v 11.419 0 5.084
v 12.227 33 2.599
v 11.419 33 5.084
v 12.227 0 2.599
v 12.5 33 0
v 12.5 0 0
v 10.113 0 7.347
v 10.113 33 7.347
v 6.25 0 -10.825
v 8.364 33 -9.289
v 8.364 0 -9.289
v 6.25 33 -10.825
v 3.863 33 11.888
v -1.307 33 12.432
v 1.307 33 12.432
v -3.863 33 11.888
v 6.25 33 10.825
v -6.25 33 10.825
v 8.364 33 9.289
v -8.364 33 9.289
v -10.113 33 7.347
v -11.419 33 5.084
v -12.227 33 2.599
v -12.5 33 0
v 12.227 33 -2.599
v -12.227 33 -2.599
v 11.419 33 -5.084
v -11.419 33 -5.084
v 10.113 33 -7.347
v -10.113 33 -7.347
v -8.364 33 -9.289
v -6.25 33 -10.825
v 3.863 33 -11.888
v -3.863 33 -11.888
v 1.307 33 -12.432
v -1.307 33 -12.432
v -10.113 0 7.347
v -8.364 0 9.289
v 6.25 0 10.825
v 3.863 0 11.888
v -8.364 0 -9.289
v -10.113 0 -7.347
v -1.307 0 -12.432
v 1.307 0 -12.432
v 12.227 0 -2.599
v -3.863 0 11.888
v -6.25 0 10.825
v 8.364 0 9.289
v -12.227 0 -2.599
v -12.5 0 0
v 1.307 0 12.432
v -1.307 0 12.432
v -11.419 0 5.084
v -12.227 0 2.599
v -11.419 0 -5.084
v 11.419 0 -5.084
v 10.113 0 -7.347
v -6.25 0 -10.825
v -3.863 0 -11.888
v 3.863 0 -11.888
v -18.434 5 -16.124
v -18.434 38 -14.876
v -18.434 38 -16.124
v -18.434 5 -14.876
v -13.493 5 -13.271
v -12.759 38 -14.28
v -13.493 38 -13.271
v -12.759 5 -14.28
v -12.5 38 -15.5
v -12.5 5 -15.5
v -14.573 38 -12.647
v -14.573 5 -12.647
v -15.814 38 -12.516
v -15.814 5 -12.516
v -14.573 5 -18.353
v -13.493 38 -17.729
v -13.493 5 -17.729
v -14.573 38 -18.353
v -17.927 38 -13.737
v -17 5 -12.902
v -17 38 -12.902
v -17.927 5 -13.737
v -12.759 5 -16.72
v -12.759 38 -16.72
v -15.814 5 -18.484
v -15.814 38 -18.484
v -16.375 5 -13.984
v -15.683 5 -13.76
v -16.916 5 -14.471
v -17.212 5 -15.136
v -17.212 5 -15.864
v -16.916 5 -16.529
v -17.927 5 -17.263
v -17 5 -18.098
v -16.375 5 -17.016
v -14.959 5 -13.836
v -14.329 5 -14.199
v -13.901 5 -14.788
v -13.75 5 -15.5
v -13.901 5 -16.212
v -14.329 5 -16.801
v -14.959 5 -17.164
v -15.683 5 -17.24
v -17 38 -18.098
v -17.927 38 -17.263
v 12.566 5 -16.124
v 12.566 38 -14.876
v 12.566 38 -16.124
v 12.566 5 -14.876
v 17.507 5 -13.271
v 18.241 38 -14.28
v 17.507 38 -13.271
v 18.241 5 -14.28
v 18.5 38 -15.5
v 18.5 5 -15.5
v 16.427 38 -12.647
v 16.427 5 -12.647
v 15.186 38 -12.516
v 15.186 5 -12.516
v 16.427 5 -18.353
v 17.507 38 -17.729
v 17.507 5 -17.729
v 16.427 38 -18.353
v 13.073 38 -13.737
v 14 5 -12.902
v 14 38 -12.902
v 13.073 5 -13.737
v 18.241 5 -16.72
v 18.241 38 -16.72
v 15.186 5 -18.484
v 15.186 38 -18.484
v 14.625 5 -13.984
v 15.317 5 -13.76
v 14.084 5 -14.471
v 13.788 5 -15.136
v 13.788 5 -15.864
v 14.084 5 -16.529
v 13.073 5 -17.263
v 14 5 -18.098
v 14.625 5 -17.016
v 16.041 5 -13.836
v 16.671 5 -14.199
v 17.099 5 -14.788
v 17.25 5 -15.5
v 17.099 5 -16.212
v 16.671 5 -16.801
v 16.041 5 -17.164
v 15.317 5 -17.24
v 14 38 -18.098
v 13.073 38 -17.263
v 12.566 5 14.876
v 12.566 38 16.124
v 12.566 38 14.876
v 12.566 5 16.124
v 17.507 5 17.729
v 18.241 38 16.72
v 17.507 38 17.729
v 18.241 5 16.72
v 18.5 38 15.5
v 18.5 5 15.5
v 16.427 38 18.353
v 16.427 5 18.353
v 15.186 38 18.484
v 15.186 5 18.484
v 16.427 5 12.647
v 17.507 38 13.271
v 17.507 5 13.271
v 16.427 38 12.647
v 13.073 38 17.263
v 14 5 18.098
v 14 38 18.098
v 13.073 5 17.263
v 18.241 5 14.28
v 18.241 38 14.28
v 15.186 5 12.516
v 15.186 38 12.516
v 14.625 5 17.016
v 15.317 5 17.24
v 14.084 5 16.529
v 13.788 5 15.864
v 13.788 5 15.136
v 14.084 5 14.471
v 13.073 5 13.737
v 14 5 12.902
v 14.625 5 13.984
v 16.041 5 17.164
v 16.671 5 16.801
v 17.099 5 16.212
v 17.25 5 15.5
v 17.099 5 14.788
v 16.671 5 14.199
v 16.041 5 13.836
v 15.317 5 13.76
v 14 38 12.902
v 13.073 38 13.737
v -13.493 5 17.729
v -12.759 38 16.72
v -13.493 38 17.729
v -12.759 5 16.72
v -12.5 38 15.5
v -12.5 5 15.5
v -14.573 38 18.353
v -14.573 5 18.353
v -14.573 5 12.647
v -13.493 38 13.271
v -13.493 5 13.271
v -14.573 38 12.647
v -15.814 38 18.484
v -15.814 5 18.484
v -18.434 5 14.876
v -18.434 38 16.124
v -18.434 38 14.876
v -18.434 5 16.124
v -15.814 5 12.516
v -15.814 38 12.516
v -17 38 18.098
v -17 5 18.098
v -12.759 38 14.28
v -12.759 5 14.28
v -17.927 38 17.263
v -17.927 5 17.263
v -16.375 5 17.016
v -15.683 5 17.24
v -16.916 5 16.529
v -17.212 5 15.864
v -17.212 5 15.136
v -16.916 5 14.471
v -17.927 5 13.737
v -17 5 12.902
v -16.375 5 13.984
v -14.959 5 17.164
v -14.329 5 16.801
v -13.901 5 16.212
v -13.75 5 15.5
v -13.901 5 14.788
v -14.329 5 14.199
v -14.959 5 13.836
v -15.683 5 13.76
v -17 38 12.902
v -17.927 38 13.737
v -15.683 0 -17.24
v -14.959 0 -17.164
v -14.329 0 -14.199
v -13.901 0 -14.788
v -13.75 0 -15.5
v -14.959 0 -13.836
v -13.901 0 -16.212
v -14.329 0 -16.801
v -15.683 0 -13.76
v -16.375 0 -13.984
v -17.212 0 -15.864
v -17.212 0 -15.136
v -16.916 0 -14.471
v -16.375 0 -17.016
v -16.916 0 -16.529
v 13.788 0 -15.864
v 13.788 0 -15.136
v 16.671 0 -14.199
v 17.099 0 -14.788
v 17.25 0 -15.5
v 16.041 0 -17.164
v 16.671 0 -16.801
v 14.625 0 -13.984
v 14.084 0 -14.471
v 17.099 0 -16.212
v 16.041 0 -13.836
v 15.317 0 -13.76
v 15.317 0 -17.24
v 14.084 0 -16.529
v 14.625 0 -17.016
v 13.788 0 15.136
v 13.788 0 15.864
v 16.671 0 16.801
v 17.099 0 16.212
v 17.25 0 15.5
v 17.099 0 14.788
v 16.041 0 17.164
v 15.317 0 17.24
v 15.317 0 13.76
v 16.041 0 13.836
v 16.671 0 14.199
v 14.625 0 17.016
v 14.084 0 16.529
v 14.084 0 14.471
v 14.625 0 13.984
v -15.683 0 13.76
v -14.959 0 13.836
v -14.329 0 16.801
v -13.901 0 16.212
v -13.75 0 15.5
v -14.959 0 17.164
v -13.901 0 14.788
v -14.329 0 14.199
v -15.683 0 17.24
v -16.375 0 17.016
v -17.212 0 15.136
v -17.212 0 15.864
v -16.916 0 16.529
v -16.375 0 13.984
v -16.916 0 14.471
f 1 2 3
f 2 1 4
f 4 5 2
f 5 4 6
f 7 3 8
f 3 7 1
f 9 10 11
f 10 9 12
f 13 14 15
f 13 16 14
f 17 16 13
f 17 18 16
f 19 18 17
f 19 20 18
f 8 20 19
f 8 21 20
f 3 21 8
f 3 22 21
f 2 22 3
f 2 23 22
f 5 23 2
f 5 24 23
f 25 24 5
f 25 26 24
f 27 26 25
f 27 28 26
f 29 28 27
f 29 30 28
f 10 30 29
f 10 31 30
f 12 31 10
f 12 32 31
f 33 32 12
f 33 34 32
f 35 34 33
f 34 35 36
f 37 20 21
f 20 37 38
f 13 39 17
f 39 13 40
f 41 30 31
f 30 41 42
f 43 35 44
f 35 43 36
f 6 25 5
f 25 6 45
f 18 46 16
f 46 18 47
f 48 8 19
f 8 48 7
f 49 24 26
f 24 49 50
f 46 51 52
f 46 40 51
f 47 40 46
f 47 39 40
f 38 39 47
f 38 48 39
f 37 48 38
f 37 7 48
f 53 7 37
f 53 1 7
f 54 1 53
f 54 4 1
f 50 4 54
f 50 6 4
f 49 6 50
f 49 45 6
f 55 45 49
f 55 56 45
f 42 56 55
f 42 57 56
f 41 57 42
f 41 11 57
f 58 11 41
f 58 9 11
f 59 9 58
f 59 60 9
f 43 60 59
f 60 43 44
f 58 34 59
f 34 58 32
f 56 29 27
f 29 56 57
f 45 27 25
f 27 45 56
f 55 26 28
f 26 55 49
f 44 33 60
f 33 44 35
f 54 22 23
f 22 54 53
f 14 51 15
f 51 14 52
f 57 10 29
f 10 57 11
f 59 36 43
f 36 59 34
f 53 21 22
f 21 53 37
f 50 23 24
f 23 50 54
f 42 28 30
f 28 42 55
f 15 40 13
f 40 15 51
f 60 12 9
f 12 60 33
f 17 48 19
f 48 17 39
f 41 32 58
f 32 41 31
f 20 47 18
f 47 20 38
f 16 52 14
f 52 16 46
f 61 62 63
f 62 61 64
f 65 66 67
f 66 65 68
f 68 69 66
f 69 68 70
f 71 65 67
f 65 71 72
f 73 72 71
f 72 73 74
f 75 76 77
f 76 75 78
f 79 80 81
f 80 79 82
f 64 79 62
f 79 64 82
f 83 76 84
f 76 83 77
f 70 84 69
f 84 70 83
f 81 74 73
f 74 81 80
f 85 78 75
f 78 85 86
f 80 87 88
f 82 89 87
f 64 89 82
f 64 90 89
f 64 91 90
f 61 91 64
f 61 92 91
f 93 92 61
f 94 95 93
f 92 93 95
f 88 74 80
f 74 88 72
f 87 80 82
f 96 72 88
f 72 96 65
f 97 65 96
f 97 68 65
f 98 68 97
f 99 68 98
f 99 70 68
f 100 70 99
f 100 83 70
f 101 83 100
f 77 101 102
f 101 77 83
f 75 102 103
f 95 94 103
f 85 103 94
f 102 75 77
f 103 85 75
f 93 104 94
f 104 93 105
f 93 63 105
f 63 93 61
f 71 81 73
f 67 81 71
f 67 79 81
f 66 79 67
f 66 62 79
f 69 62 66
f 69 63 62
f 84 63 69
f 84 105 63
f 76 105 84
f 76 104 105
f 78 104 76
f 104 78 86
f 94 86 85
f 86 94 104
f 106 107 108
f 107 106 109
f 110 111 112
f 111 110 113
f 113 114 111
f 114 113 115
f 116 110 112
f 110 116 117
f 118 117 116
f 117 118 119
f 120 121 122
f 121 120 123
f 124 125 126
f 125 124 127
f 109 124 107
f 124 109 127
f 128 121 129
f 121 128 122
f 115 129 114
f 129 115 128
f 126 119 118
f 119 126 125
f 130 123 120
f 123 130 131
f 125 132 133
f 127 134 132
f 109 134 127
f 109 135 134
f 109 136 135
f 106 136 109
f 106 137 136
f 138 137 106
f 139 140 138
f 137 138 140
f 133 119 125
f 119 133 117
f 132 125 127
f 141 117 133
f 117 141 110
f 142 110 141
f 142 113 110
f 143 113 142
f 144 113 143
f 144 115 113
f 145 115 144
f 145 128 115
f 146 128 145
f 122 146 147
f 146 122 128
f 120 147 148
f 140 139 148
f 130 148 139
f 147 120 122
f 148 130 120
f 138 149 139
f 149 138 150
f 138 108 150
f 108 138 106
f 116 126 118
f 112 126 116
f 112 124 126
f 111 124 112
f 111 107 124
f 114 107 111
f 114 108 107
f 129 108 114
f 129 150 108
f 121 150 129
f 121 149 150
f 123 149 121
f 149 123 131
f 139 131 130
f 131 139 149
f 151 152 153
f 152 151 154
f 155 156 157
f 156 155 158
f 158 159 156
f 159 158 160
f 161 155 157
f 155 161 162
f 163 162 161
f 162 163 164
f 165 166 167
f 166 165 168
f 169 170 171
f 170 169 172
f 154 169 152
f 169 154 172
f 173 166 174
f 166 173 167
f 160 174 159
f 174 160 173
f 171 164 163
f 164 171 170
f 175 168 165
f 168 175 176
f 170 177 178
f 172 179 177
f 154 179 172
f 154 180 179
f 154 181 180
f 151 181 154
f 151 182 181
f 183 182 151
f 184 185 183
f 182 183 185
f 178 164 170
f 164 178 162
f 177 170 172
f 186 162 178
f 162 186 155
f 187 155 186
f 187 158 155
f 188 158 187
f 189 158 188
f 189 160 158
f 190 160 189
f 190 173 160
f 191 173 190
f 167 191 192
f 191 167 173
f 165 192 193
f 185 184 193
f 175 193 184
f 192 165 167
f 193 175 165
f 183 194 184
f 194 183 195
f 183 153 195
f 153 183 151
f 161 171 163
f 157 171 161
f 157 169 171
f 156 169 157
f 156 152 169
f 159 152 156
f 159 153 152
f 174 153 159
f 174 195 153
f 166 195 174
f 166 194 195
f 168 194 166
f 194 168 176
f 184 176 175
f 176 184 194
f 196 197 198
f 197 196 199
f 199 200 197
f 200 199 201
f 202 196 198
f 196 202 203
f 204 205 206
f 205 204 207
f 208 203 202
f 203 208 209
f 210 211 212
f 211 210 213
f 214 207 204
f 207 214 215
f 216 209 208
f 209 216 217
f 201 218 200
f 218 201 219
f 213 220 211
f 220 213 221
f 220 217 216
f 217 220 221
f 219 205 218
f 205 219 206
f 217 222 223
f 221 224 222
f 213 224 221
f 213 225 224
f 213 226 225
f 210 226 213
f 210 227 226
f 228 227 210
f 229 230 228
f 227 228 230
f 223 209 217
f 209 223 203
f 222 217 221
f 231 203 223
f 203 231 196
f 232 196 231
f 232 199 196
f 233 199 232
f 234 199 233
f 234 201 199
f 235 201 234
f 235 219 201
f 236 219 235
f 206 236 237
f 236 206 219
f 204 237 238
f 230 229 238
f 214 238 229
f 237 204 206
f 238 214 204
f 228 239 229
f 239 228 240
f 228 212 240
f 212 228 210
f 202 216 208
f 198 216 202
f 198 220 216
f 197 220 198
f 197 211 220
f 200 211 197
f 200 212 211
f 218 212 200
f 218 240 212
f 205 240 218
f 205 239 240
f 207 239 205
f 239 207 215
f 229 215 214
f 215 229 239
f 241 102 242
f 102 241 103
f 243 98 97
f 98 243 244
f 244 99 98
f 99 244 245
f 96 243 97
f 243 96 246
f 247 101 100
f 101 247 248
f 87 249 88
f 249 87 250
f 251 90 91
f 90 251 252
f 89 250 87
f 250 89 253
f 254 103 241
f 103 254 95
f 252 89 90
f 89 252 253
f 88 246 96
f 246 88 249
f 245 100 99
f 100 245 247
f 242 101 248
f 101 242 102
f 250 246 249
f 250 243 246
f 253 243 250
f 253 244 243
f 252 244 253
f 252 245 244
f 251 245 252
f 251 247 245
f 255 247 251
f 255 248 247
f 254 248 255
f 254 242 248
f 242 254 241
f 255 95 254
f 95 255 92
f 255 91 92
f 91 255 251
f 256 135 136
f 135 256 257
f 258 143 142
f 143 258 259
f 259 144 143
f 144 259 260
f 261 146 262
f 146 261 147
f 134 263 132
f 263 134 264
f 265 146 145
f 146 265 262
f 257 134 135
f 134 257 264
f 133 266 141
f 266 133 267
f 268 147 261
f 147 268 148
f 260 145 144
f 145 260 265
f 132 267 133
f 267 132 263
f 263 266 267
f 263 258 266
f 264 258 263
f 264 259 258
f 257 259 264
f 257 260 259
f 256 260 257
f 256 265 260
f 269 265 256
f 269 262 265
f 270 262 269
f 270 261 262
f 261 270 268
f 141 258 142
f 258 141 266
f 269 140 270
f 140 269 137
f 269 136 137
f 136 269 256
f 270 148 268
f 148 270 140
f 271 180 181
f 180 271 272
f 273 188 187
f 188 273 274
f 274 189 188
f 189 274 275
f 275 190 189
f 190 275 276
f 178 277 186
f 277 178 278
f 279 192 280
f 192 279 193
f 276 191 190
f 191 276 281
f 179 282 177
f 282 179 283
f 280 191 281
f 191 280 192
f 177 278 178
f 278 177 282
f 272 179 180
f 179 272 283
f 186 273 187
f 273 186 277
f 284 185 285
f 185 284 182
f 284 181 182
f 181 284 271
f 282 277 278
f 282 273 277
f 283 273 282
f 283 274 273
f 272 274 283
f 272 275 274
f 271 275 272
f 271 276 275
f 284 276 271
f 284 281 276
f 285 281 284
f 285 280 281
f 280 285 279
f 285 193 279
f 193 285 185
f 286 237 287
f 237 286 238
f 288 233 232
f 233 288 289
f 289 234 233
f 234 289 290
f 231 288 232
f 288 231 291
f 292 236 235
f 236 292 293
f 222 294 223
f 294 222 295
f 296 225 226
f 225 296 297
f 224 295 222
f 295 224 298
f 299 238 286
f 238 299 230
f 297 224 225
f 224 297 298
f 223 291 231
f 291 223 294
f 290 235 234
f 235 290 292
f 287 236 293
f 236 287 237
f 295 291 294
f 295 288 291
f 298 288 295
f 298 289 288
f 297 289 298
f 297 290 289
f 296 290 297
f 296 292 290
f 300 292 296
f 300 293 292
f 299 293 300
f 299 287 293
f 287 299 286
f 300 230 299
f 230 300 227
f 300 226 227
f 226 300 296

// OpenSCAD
// file: shared_variables.scad
// sled
sled_length = 29.5;
sled_width = 34.5;
sled_x_distance = 17.5;
sled_y_distance = 23.5;
sled_screw_hole_diameter = 4.5;
sled_screw_head_diameter = 7;
sled_screw_head_th = 3;

// nema 17 stepper motor
motor_width = 45;
motor_mount_height = 40;

// roundbar
axle_holder_width = 30;
axle_set_depth = 14;
roundbar_diameter = 8 + 0.4;
axle_mount_hole_center = (axle_holder_width - roundbar_diameter) / 4;
axle_fastener_height = 12;


// general
y_axle_distance = 30;
bottom_th = 8;
wall_th = 8;
sled_clearing_distance = 10 + 2;
motor_backset = 25;
axle_height = 20;
motor_mount_width = motor_width / 2 + y_axle_distance + axle_holder_width / 2;
m3_hole_d = 3.2;
// main file
include <shared_variables.scad>

nema_17_negative();

module nema_17_negative() {
    translate([0, wall_th, 0]) {
        rotate([90,0,0]) {
            translate([0, 0, -25]) cylinder(d = 25, h = 33);

            translate([-15.5, -15.5, -30]) cylinder(d = 6, h = 33, $fn=15);
            translate([15.5, -15.5, -30]) cylinder(d = 6, h = 33, $fn=15);
            translate([15.5, 15.5, -30]) cylinder(d = 6, h = 33, $fn=15);
            translate([-15.5, 15.5, -30]) cylinder(d = 6, h = 33, $fn=15);

            translate([-15.5, -15.5, 0]) cylinder(d = 3.5, h = wall_th, $fn=15);
            translate([15.5, -15.5, 0]) cylinder(d = 3.5, h = wall_th, $fn=15);
            translate([15.5, 15.5, 0]) cylinder(d = 3.5, h = wall_th, $fn=15);
            translate([-15.5, 15.5, 0]) cylinder(d = 3.5, h = wall_th, $fn=15);
        }
    }
}
